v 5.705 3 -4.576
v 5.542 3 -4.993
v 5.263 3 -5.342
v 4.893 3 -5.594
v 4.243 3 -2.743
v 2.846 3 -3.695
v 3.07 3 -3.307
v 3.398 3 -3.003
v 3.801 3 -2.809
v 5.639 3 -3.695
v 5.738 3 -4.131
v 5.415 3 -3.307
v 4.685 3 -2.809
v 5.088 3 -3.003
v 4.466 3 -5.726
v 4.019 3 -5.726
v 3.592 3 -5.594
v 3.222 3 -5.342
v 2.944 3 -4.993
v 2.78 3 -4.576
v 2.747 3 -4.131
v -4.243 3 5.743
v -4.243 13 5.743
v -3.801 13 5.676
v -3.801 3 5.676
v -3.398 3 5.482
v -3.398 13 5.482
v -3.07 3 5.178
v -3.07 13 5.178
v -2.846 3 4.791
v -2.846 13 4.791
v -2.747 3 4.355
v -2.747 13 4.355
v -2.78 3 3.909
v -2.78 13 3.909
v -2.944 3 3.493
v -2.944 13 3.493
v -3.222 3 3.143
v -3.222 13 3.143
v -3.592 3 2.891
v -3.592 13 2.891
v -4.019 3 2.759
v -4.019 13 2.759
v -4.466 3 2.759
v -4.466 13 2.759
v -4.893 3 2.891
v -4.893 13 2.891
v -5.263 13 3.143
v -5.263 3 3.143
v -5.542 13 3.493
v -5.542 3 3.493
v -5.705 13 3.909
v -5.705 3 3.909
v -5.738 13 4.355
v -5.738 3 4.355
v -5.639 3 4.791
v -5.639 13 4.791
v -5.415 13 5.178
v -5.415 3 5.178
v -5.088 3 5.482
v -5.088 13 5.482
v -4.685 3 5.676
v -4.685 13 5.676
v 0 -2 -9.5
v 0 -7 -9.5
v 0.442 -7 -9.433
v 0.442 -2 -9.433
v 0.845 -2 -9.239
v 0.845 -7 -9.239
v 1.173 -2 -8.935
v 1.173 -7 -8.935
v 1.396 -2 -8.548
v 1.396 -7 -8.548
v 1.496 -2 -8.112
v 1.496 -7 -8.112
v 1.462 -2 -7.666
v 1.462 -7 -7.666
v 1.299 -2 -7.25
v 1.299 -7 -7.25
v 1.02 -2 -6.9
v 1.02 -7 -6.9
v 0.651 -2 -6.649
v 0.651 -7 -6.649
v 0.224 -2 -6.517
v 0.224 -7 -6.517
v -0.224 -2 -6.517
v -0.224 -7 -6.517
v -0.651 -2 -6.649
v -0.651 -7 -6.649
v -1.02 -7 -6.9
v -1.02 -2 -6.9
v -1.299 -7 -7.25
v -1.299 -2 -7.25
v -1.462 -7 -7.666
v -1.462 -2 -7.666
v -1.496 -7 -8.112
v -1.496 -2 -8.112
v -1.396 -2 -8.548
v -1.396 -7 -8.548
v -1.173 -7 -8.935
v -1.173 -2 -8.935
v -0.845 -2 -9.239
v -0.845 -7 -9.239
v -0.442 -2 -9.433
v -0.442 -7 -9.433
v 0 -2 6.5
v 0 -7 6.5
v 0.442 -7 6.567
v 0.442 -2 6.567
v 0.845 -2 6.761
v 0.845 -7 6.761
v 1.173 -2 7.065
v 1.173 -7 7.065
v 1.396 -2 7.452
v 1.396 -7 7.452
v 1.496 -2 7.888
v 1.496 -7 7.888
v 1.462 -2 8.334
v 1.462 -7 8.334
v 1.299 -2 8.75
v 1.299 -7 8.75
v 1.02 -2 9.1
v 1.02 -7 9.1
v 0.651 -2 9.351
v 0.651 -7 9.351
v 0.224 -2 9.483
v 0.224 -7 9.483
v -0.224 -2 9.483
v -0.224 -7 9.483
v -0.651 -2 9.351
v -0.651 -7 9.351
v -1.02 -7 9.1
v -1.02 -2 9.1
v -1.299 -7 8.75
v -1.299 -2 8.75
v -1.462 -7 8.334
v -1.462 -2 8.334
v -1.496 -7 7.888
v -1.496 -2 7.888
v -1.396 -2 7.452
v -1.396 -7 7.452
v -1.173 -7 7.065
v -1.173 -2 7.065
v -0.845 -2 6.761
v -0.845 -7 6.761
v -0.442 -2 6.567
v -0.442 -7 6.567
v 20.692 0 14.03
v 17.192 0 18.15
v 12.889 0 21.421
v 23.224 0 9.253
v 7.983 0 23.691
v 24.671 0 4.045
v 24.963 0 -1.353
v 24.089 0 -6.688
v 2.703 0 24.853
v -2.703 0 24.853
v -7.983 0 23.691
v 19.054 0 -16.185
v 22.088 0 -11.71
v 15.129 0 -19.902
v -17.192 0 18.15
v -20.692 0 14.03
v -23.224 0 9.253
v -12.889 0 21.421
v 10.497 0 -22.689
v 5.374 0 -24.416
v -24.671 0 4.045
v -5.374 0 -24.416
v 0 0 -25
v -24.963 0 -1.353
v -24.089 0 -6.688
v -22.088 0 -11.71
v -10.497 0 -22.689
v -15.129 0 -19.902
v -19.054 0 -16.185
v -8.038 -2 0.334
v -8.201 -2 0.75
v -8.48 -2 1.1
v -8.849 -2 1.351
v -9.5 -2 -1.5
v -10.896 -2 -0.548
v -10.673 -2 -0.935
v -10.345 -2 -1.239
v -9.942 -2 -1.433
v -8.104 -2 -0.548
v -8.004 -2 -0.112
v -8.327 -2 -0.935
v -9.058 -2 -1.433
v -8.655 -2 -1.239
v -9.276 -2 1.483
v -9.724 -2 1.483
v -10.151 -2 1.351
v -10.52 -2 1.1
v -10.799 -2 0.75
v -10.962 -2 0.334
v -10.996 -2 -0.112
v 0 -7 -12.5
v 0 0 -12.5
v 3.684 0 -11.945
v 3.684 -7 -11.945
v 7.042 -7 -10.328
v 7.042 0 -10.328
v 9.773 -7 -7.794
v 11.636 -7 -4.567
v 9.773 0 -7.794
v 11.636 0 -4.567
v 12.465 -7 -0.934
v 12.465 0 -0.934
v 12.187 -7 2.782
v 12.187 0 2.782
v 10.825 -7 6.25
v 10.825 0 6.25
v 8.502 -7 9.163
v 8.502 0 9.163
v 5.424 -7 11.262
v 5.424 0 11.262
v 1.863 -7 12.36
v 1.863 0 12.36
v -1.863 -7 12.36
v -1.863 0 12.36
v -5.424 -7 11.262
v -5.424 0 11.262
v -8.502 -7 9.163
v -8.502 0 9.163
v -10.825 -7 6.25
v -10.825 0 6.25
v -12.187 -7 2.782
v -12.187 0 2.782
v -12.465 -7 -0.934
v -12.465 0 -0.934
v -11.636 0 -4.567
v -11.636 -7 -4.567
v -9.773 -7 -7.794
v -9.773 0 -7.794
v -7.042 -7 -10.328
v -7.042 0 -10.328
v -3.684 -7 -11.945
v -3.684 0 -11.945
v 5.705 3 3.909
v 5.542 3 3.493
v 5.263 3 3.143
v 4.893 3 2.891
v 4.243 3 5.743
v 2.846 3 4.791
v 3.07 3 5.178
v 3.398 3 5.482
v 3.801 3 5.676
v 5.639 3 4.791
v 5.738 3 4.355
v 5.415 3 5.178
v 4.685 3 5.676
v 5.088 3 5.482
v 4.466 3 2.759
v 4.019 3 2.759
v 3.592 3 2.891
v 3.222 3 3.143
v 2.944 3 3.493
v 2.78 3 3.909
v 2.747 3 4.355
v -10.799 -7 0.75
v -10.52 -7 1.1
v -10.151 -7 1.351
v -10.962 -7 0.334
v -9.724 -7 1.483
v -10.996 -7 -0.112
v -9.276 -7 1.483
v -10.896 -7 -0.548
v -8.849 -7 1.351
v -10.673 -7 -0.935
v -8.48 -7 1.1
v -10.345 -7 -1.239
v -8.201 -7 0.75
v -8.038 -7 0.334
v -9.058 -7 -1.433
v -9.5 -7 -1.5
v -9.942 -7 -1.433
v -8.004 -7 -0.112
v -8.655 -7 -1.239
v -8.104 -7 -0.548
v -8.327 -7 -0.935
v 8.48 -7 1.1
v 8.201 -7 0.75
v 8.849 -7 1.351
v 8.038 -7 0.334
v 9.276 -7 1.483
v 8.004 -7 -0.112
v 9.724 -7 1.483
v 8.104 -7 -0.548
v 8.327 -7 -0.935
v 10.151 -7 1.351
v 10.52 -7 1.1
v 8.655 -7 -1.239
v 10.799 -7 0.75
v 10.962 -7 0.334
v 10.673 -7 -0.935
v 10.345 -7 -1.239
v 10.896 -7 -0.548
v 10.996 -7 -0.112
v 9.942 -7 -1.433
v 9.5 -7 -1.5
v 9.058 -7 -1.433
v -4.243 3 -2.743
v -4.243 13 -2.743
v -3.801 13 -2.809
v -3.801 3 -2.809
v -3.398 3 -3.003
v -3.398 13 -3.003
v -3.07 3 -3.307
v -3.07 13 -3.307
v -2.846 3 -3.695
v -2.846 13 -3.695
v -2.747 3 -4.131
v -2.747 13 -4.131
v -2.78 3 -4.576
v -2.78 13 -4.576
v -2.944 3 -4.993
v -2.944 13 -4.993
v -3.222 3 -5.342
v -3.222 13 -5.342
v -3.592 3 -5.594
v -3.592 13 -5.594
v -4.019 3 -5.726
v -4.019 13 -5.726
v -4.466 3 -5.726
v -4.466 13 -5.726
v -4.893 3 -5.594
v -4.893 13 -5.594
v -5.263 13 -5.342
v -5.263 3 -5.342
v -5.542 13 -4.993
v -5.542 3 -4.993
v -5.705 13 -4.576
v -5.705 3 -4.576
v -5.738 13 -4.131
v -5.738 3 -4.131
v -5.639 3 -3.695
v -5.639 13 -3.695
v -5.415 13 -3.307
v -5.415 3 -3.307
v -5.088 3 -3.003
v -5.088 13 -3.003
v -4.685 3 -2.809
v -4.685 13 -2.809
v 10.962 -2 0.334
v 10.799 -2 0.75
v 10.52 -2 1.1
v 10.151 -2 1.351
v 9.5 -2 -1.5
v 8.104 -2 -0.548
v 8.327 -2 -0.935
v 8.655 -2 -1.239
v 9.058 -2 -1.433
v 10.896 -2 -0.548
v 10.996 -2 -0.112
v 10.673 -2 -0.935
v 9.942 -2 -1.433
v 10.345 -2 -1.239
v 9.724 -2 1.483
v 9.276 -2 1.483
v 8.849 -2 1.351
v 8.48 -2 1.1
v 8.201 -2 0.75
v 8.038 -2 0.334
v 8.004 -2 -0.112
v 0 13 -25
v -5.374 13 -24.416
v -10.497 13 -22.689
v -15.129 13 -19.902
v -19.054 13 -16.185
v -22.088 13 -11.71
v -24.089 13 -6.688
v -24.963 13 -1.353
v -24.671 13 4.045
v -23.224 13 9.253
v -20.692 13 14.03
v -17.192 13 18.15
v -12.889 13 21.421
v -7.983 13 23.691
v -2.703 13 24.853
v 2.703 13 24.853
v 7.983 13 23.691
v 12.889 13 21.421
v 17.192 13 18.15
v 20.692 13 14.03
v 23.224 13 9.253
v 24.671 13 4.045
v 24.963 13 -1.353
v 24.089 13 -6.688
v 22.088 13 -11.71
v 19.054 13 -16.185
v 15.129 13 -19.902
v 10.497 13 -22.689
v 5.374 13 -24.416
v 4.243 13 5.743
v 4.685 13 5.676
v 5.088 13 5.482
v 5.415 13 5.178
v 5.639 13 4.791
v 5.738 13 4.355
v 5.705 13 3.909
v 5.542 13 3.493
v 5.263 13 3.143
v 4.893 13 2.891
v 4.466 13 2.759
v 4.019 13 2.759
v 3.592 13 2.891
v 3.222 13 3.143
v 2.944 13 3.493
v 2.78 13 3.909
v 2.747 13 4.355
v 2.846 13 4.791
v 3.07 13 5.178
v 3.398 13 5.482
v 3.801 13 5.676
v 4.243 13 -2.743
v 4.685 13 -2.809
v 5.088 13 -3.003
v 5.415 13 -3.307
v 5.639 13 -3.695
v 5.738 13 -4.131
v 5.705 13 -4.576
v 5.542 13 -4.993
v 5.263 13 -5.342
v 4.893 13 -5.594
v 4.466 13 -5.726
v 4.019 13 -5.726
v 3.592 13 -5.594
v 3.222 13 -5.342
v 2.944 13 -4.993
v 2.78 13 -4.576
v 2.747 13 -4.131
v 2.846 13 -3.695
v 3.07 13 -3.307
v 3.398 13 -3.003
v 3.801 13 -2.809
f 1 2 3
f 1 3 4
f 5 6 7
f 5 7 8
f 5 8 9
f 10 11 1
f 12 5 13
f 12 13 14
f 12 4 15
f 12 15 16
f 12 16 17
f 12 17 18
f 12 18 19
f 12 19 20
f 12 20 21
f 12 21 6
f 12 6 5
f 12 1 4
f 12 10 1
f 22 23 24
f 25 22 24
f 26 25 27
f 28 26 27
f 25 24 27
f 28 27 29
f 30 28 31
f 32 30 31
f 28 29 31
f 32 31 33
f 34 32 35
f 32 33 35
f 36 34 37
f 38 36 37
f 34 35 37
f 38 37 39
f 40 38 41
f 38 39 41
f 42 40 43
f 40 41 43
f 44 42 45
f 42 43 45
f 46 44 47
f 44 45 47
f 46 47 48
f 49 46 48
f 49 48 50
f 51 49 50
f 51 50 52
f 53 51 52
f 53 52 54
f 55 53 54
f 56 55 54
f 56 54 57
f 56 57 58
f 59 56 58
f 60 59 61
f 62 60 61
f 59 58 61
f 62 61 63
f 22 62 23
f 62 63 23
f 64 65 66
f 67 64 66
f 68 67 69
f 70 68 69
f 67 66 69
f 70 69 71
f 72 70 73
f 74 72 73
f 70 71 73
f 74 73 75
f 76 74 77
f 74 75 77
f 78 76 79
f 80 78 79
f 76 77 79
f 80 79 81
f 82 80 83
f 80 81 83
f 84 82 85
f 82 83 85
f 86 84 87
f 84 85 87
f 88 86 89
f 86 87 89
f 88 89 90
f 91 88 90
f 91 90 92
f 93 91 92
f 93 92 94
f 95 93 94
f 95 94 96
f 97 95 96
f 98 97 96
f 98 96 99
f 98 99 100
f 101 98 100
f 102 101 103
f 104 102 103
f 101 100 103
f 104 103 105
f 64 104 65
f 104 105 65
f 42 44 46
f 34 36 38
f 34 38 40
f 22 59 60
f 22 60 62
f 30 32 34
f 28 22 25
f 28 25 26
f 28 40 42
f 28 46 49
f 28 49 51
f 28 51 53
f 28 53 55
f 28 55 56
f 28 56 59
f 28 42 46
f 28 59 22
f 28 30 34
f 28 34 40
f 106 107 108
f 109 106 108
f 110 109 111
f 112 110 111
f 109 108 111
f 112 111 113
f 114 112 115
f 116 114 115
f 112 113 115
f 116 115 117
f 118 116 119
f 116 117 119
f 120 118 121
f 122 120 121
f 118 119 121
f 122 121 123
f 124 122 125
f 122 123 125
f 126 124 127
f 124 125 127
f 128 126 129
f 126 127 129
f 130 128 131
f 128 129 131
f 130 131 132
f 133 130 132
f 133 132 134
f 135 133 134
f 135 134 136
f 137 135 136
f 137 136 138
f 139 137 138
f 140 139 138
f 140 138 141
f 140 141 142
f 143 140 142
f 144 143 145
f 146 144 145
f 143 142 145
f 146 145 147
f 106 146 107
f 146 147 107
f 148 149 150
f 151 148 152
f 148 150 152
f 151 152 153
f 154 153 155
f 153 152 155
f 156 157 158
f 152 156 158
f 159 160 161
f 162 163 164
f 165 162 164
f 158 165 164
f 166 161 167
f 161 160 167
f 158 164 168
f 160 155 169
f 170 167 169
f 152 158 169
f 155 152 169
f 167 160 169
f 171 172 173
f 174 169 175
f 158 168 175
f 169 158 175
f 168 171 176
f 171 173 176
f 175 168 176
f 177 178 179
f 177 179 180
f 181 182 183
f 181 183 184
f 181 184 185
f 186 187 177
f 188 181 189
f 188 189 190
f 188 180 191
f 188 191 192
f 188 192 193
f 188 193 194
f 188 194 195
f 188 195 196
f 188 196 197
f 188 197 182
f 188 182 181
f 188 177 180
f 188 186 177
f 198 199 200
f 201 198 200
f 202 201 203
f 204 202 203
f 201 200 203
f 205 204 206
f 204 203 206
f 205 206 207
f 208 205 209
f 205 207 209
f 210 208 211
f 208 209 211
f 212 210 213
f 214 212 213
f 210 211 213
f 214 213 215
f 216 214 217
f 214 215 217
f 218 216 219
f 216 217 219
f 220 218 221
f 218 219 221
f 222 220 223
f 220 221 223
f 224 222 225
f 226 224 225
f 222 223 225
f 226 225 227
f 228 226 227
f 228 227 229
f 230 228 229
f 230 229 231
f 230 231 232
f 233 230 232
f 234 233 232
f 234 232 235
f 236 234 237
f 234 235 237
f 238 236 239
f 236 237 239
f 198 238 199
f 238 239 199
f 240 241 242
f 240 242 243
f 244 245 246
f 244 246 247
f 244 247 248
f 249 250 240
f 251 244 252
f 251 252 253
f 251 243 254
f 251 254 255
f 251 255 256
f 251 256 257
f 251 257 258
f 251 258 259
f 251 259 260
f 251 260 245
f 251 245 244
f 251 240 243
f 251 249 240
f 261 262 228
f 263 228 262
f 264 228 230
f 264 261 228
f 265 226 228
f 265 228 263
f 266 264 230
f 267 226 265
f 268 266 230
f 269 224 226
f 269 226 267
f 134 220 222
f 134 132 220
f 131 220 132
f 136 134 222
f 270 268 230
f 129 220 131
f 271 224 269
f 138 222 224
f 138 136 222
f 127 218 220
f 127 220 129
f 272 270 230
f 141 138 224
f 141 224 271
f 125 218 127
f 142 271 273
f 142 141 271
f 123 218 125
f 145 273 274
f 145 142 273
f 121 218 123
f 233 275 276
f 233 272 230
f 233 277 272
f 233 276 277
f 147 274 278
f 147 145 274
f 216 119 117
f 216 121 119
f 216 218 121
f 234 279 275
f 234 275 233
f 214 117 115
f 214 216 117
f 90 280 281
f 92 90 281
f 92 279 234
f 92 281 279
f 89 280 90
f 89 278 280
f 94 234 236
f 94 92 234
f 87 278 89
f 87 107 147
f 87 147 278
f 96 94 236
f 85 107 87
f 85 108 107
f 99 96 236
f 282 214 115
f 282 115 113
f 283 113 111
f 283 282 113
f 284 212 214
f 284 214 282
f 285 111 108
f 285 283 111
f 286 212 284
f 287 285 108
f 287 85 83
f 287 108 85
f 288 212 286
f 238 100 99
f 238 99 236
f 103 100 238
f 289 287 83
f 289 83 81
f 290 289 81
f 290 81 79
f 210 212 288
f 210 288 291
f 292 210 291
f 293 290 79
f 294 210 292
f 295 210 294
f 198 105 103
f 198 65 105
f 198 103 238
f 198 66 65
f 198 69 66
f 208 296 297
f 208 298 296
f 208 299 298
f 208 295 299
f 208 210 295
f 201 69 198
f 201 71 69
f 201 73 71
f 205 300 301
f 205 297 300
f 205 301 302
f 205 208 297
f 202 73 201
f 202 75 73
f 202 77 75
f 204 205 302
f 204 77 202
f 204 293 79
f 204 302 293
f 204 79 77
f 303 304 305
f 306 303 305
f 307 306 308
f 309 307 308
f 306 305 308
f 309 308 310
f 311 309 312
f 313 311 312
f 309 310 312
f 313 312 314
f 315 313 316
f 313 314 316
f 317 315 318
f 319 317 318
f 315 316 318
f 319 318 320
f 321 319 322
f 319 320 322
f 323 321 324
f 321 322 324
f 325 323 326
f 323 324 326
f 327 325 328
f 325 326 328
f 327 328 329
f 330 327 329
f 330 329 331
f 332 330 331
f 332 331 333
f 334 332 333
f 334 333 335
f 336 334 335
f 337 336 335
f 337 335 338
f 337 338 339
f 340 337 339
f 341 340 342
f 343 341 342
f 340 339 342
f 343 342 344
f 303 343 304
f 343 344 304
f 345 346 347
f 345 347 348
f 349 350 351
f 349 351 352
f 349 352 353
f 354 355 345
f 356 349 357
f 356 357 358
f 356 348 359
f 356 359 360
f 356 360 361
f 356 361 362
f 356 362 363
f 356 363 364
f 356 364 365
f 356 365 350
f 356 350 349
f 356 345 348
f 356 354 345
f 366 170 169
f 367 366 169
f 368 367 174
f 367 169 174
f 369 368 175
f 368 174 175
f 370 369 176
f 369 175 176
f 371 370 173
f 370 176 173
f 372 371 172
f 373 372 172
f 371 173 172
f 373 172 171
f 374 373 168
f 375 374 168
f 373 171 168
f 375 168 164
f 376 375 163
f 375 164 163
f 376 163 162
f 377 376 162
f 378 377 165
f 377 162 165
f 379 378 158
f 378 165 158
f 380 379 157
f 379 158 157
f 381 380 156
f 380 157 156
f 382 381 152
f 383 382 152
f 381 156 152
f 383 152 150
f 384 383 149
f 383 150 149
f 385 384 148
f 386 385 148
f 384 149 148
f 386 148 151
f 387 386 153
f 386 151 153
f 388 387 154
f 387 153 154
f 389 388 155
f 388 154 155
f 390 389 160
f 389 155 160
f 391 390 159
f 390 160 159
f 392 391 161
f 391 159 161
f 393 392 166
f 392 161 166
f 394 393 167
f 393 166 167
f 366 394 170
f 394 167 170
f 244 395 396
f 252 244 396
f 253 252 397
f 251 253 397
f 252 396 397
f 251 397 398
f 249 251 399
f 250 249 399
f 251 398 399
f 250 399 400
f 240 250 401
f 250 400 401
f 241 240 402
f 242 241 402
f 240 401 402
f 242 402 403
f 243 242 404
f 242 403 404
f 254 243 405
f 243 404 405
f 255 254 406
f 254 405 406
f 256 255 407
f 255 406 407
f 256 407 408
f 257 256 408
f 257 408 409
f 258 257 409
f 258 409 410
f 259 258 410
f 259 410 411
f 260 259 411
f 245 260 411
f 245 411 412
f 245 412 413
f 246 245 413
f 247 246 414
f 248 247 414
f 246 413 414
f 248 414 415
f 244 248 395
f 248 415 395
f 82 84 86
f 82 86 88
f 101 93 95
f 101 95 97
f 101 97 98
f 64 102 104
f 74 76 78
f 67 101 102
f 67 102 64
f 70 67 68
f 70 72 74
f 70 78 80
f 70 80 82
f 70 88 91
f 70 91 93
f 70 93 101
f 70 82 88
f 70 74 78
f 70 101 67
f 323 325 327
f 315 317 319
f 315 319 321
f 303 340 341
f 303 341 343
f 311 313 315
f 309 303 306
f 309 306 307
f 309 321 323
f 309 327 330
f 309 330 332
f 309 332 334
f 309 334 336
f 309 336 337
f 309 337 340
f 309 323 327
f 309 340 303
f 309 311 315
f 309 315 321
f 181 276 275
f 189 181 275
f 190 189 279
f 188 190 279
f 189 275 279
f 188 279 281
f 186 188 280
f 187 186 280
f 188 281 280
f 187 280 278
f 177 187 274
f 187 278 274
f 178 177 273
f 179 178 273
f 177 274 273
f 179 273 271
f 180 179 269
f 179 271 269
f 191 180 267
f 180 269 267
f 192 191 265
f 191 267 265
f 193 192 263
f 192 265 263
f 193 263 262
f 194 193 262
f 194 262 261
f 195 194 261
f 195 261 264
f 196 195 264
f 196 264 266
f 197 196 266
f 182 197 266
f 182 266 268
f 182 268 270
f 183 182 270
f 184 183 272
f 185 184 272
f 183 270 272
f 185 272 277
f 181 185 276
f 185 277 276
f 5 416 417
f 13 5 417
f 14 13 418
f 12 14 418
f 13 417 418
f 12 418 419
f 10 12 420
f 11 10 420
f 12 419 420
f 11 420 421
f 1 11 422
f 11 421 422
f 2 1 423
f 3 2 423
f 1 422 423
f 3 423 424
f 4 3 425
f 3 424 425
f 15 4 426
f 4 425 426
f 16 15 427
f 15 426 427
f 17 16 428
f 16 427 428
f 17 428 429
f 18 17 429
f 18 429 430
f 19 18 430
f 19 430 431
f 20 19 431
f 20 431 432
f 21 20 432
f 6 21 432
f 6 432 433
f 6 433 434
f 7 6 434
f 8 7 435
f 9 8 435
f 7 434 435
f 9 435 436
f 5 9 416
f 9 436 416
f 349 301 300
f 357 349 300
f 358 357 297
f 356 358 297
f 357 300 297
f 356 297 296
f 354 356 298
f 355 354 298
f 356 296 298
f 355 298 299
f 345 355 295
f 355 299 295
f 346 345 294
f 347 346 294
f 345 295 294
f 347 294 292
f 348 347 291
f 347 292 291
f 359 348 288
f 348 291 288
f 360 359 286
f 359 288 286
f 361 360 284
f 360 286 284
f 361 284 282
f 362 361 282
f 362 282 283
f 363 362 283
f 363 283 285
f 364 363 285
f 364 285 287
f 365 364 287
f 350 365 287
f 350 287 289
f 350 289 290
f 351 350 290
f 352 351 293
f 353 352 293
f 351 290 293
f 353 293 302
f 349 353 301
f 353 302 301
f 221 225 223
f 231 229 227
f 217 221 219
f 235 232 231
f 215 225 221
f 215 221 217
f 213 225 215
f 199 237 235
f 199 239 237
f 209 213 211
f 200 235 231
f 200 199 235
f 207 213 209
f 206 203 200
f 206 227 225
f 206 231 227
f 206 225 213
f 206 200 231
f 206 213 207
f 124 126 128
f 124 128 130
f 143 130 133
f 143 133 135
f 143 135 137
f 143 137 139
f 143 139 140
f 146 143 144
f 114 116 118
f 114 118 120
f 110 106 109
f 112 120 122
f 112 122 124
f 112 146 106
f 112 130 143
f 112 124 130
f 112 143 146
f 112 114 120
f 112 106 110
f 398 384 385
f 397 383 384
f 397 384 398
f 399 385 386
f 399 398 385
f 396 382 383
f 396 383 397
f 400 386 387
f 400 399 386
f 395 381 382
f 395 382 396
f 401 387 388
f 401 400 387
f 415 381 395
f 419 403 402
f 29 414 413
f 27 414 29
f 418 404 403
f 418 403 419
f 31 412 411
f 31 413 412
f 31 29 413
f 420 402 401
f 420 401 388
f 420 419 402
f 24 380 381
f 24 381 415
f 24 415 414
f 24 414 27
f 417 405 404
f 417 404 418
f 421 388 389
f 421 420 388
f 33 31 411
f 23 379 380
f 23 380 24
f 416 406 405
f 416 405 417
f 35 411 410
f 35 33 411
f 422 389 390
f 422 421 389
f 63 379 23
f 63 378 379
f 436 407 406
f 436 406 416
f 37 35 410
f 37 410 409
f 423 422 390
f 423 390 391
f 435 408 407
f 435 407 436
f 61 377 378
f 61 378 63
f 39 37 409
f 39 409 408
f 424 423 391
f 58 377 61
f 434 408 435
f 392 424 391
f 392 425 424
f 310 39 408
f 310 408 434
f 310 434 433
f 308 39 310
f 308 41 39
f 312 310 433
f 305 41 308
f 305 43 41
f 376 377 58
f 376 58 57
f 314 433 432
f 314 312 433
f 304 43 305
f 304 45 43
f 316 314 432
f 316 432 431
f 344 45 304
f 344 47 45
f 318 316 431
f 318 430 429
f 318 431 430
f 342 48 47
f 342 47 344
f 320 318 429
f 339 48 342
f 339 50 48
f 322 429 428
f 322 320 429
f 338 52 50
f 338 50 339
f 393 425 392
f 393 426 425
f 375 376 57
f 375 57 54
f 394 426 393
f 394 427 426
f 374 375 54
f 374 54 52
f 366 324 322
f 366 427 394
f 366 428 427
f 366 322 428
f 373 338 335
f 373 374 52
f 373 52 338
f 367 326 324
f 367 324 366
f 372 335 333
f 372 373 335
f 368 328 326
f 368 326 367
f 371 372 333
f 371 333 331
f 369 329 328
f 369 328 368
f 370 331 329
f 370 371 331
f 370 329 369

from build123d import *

# Parameters (mm, degrees)
SKETCH1_R           = 25
BOSS_EXTRUDE1_DEPTH = 13
SKETCH2_R           = 12.5
BOSS_EXTRUDE2_DEPTH = 7
SKETCH3_R           = 1.5
CUT_EXTRUDE1_DEPTH  = 10
SKETCH4_R           = 1.5
CUT_EXTRUDE2_DEPTH  = 5


# Read off the part's stored shape, not the designer's step: Split1
with BuildPart() as part:
    # Sketch1 → Boss-Extrude1 (new body)
    with BuildSketch(Plane(origin=(0, 0, 0), x_dir=(1, 0, 0), z_dir=(0, 1, 0))):
        with Locations(Location((0, 0, 0), (0, 0, 90))):
            Circle(SKETCH1_R)
    extrude(amount=BOSS_EXTRUDE1_DEPTH)

    # Sketch2 → Boss-Extrude2 (add)
    with BuildSketch(Plane.XZ):
        with Locations(Location((0, 0, 0), (0, 0, 270))):
            Circle(SKETCH2_R)
    extrude(amount=BOSS_EXTRUDE2_DEPTH)

    # Sketch3 → Cut-Extrude1 (cut)
    with BuildSketch(Plane(origin=(0, 13, 0), x_dir=(1, 0, 0), z_dir=(0, 1, 0))):
        with Locations(Location((-4.242640687, 4.242640687, 0), (0, 0, 270))):
            Circle(SKETCH3_R)
        with Locations(Location((4.242640687, 4.242640687, 0), (0, 0, 270))):
            Circle(SKETCH3_R)
        with Locations(Location((4.242640687, -4.242640687, 0), (0, 0, 270))):
            Circle(SKETCH3_R)
        with Locations(Location((-4.242640687, -4.242640687, 0), (0, 0, 270))):
            Circle(SKETCH3_R)
    extrude(amount=-CUT_EXTRUDE1_DEPTH, mode=Mode.SUBTRACT)

    # Sketch4 → Cut-Extrude2 (cut)
    with BuildSketch(Plane.XZ.offset(7)):
        with Locations(Location((9.5, 0, 0), (0, 0, 270))):
            Circle(SKETCH4_R)
        with Locations(Location((-9.5, 0, 0), (0, 0, 270))):
            Circle(SKETCH4_R)
        with Locations(Location((0, 8, 0), (0, 0, 270))):
            Circle(SKETCH4_R)
        with Locations(Location((0, -8, 0), (0, 0, 270))):
            Circle(SKETCH4_R)
    extrude(amount=-CUT_EXTRUDE2_DEPTH, mode=Mode.SUBTRACT)


with BuildPart() as body_2:
    # Split1: the piece on the far side of the plane
    add(part.part)
    split(bisect_by=Plane(origin=(0, 0, 0), x_dir=(1, 0, 0), z_dir=(0, 1, 0)), keep=Keep.BOTTOM)


with BuildPart() as part_1:
    add(part.part)

    # Split1
    split(bisect_by=Plane(origin=(0, 0, 0), x_dir=(1, 0, 0), z_dir=(0, 1, 0)), keep=Keep.TOP)


solid = Compound([body_2.part, part_1.part])
